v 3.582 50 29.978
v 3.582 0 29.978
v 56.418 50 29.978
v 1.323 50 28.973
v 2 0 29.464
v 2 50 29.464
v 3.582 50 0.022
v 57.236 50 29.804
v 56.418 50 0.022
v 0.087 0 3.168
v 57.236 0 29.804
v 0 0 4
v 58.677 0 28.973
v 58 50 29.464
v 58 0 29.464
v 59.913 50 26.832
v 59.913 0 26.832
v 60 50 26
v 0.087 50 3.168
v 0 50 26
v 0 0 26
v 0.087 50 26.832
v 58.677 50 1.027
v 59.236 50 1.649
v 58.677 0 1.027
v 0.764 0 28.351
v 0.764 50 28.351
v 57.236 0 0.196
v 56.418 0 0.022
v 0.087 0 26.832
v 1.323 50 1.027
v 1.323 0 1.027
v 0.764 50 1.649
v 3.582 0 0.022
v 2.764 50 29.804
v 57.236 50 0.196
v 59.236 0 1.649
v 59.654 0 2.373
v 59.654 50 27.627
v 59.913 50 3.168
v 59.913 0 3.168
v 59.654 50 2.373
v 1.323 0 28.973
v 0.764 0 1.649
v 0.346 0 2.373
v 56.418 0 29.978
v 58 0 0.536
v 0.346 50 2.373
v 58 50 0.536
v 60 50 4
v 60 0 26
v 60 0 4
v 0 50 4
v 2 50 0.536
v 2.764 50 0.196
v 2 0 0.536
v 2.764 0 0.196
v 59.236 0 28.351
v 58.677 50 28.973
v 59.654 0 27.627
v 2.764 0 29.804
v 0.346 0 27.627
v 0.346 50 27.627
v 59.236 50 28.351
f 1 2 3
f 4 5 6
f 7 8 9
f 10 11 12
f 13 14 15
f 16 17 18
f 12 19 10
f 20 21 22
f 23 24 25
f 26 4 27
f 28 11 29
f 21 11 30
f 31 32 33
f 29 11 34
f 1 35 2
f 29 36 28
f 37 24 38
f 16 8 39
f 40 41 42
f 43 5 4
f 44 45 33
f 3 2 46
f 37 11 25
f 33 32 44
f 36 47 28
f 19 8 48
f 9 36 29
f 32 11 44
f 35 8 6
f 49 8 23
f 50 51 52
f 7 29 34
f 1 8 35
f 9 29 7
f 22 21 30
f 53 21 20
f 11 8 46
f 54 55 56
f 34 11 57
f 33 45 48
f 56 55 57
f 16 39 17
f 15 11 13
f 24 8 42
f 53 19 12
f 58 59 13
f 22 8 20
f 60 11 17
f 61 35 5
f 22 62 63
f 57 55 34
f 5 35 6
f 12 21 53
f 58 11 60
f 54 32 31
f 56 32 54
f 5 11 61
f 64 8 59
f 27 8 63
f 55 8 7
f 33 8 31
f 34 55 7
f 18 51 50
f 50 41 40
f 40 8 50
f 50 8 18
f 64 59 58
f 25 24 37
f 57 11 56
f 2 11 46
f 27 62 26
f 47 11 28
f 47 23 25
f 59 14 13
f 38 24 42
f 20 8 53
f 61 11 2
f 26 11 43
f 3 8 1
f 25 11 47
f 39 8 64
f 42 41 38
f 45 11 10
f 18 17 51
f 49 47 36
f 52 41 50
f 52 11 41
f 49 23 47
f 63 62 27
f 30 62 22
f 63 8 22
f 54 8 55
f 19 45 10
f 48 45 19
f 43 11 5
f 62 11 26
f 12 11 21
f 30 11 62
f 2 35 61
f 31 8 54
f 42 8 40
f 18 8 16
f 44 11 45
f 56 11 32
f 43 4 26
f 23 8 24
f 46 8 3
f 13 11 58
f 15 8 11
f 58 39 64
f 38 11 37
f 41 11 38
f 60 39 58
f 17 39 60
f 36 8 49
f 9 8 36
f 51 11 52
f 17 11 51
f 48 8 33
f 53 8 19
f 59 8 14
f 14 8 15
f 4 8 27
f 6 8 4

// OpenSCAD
$fs=0.1;

BoxH(60,50,30,8);

module BoxH(width,depth,height,dia) {
 hull() {
  translate([dia/2,depth,dia/2]) rotate([90,0,0])cylinder(d=dia,h=depth);
  translate([width-dia/2,depth,dia/2]) rotate([90,0,0])cylinder(d=dia,h=depth);
  translate([width-dia/2,depth,height-dia/2]) rotate([90,0,0])cylinder(d=dia,h=depth);
  translate([dia/2,depth,height-dia/2]) rotate([90,0,0])cylinder(d=dia,h=depth);  
 } 
}
